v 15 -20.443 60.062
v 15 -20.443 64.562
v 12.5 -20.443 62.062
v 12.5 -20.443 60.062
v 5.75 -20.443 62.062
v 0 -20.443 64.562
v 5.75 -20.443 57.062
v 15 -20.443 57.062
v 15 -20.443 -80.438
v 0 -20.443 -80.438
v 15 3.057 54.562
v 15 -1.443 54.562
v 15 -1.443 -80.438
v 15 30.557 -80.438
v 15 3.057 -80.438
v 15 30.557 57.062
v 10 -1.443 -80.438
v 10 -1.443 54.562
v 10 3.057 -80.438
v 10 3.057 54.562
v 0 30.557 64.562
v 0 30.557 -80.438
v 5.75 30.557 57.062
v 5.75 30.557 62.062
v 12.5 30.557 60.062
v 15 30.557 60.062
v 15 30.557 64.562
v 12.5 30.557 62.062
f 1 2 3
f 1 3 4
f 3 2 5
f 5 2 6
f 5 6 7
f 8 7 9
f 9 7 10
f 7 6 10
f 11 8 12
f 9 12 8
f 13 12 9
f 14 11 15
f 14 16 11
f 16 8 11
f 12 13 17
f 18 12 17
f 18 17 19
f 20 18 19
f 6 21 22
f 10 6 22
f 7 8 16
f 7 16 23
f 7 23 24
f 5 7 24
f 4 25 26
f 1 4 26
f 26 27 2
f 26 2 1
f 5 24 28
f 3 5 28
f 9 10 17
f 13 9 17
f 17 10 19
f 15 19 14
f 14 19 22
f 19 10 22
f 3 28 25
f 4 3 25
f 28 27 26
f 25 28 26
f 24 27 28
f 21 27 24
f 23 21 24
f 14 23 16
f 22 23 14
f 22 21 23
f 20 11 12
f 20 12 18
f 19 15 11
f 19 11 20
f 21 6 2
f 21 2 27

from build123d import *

# Parameters (mm, degrees)
SKETCH1_W           = 145
SKETCH1_H           = 51
BOSS_EXTRUDE1_DEPTH = 15
CUT_EXTRUDE3_DEPTH  = 52
SKETCH7_W           = 5
SKETCH7_H           = 4.5
CUT_EXTRUDE5_DEPTH  = 135


with BuildPart() as part:
    # Sketch1 → Boss-Extrude1 (new body)
    with BuildSketch(Plane(origin=(0, 0, 0), x_dir=(0, 0, -1), z_dir=(1, 0, 0))):
        with Locations((7.937921078, 5.057266603)):
            Rectangle(SKETCH1_W, SKETCH1_H)
    extrude(amount=BOSS_EXTRUDE1_DEPTH)

    # Sketch6 → Cut-Extrude3 (cut, through all)
    with BuildSketch(Plane(origin=(0, 30.557266603, 0), x_dir=(1, 0, 0), z_dir=(0, 1, 0))):
        Polygon((12.5, -60.062078922), (15, -60.062078922), (15, -57.062078922), (12.5, -57.062078922), (5.75, -57.062078922), (5.75, -62.062078922), (12.5, -62.062078922), align=None)
    extrude(amount=-CUT_EXTRUDE3_DEPTH, mode=Mode.SUBTRACT)

    # Sketch7 → Cut-Extrude5 (cut)
    with BuildSketch(Plane(origin=(0, 0, -80.437921078), x_dir=(-1, 0, 0), z_dir=(0, 0, -1))):
        with Locations((-12.5, 0.807266603)):
            Rectangle(SKETCH7_W, SKETCH7_H)
    extrude(amount=-CUT_EXTRUDE5_DEPTH, mode=Mode.SUBTRACT)


solid = part.part
